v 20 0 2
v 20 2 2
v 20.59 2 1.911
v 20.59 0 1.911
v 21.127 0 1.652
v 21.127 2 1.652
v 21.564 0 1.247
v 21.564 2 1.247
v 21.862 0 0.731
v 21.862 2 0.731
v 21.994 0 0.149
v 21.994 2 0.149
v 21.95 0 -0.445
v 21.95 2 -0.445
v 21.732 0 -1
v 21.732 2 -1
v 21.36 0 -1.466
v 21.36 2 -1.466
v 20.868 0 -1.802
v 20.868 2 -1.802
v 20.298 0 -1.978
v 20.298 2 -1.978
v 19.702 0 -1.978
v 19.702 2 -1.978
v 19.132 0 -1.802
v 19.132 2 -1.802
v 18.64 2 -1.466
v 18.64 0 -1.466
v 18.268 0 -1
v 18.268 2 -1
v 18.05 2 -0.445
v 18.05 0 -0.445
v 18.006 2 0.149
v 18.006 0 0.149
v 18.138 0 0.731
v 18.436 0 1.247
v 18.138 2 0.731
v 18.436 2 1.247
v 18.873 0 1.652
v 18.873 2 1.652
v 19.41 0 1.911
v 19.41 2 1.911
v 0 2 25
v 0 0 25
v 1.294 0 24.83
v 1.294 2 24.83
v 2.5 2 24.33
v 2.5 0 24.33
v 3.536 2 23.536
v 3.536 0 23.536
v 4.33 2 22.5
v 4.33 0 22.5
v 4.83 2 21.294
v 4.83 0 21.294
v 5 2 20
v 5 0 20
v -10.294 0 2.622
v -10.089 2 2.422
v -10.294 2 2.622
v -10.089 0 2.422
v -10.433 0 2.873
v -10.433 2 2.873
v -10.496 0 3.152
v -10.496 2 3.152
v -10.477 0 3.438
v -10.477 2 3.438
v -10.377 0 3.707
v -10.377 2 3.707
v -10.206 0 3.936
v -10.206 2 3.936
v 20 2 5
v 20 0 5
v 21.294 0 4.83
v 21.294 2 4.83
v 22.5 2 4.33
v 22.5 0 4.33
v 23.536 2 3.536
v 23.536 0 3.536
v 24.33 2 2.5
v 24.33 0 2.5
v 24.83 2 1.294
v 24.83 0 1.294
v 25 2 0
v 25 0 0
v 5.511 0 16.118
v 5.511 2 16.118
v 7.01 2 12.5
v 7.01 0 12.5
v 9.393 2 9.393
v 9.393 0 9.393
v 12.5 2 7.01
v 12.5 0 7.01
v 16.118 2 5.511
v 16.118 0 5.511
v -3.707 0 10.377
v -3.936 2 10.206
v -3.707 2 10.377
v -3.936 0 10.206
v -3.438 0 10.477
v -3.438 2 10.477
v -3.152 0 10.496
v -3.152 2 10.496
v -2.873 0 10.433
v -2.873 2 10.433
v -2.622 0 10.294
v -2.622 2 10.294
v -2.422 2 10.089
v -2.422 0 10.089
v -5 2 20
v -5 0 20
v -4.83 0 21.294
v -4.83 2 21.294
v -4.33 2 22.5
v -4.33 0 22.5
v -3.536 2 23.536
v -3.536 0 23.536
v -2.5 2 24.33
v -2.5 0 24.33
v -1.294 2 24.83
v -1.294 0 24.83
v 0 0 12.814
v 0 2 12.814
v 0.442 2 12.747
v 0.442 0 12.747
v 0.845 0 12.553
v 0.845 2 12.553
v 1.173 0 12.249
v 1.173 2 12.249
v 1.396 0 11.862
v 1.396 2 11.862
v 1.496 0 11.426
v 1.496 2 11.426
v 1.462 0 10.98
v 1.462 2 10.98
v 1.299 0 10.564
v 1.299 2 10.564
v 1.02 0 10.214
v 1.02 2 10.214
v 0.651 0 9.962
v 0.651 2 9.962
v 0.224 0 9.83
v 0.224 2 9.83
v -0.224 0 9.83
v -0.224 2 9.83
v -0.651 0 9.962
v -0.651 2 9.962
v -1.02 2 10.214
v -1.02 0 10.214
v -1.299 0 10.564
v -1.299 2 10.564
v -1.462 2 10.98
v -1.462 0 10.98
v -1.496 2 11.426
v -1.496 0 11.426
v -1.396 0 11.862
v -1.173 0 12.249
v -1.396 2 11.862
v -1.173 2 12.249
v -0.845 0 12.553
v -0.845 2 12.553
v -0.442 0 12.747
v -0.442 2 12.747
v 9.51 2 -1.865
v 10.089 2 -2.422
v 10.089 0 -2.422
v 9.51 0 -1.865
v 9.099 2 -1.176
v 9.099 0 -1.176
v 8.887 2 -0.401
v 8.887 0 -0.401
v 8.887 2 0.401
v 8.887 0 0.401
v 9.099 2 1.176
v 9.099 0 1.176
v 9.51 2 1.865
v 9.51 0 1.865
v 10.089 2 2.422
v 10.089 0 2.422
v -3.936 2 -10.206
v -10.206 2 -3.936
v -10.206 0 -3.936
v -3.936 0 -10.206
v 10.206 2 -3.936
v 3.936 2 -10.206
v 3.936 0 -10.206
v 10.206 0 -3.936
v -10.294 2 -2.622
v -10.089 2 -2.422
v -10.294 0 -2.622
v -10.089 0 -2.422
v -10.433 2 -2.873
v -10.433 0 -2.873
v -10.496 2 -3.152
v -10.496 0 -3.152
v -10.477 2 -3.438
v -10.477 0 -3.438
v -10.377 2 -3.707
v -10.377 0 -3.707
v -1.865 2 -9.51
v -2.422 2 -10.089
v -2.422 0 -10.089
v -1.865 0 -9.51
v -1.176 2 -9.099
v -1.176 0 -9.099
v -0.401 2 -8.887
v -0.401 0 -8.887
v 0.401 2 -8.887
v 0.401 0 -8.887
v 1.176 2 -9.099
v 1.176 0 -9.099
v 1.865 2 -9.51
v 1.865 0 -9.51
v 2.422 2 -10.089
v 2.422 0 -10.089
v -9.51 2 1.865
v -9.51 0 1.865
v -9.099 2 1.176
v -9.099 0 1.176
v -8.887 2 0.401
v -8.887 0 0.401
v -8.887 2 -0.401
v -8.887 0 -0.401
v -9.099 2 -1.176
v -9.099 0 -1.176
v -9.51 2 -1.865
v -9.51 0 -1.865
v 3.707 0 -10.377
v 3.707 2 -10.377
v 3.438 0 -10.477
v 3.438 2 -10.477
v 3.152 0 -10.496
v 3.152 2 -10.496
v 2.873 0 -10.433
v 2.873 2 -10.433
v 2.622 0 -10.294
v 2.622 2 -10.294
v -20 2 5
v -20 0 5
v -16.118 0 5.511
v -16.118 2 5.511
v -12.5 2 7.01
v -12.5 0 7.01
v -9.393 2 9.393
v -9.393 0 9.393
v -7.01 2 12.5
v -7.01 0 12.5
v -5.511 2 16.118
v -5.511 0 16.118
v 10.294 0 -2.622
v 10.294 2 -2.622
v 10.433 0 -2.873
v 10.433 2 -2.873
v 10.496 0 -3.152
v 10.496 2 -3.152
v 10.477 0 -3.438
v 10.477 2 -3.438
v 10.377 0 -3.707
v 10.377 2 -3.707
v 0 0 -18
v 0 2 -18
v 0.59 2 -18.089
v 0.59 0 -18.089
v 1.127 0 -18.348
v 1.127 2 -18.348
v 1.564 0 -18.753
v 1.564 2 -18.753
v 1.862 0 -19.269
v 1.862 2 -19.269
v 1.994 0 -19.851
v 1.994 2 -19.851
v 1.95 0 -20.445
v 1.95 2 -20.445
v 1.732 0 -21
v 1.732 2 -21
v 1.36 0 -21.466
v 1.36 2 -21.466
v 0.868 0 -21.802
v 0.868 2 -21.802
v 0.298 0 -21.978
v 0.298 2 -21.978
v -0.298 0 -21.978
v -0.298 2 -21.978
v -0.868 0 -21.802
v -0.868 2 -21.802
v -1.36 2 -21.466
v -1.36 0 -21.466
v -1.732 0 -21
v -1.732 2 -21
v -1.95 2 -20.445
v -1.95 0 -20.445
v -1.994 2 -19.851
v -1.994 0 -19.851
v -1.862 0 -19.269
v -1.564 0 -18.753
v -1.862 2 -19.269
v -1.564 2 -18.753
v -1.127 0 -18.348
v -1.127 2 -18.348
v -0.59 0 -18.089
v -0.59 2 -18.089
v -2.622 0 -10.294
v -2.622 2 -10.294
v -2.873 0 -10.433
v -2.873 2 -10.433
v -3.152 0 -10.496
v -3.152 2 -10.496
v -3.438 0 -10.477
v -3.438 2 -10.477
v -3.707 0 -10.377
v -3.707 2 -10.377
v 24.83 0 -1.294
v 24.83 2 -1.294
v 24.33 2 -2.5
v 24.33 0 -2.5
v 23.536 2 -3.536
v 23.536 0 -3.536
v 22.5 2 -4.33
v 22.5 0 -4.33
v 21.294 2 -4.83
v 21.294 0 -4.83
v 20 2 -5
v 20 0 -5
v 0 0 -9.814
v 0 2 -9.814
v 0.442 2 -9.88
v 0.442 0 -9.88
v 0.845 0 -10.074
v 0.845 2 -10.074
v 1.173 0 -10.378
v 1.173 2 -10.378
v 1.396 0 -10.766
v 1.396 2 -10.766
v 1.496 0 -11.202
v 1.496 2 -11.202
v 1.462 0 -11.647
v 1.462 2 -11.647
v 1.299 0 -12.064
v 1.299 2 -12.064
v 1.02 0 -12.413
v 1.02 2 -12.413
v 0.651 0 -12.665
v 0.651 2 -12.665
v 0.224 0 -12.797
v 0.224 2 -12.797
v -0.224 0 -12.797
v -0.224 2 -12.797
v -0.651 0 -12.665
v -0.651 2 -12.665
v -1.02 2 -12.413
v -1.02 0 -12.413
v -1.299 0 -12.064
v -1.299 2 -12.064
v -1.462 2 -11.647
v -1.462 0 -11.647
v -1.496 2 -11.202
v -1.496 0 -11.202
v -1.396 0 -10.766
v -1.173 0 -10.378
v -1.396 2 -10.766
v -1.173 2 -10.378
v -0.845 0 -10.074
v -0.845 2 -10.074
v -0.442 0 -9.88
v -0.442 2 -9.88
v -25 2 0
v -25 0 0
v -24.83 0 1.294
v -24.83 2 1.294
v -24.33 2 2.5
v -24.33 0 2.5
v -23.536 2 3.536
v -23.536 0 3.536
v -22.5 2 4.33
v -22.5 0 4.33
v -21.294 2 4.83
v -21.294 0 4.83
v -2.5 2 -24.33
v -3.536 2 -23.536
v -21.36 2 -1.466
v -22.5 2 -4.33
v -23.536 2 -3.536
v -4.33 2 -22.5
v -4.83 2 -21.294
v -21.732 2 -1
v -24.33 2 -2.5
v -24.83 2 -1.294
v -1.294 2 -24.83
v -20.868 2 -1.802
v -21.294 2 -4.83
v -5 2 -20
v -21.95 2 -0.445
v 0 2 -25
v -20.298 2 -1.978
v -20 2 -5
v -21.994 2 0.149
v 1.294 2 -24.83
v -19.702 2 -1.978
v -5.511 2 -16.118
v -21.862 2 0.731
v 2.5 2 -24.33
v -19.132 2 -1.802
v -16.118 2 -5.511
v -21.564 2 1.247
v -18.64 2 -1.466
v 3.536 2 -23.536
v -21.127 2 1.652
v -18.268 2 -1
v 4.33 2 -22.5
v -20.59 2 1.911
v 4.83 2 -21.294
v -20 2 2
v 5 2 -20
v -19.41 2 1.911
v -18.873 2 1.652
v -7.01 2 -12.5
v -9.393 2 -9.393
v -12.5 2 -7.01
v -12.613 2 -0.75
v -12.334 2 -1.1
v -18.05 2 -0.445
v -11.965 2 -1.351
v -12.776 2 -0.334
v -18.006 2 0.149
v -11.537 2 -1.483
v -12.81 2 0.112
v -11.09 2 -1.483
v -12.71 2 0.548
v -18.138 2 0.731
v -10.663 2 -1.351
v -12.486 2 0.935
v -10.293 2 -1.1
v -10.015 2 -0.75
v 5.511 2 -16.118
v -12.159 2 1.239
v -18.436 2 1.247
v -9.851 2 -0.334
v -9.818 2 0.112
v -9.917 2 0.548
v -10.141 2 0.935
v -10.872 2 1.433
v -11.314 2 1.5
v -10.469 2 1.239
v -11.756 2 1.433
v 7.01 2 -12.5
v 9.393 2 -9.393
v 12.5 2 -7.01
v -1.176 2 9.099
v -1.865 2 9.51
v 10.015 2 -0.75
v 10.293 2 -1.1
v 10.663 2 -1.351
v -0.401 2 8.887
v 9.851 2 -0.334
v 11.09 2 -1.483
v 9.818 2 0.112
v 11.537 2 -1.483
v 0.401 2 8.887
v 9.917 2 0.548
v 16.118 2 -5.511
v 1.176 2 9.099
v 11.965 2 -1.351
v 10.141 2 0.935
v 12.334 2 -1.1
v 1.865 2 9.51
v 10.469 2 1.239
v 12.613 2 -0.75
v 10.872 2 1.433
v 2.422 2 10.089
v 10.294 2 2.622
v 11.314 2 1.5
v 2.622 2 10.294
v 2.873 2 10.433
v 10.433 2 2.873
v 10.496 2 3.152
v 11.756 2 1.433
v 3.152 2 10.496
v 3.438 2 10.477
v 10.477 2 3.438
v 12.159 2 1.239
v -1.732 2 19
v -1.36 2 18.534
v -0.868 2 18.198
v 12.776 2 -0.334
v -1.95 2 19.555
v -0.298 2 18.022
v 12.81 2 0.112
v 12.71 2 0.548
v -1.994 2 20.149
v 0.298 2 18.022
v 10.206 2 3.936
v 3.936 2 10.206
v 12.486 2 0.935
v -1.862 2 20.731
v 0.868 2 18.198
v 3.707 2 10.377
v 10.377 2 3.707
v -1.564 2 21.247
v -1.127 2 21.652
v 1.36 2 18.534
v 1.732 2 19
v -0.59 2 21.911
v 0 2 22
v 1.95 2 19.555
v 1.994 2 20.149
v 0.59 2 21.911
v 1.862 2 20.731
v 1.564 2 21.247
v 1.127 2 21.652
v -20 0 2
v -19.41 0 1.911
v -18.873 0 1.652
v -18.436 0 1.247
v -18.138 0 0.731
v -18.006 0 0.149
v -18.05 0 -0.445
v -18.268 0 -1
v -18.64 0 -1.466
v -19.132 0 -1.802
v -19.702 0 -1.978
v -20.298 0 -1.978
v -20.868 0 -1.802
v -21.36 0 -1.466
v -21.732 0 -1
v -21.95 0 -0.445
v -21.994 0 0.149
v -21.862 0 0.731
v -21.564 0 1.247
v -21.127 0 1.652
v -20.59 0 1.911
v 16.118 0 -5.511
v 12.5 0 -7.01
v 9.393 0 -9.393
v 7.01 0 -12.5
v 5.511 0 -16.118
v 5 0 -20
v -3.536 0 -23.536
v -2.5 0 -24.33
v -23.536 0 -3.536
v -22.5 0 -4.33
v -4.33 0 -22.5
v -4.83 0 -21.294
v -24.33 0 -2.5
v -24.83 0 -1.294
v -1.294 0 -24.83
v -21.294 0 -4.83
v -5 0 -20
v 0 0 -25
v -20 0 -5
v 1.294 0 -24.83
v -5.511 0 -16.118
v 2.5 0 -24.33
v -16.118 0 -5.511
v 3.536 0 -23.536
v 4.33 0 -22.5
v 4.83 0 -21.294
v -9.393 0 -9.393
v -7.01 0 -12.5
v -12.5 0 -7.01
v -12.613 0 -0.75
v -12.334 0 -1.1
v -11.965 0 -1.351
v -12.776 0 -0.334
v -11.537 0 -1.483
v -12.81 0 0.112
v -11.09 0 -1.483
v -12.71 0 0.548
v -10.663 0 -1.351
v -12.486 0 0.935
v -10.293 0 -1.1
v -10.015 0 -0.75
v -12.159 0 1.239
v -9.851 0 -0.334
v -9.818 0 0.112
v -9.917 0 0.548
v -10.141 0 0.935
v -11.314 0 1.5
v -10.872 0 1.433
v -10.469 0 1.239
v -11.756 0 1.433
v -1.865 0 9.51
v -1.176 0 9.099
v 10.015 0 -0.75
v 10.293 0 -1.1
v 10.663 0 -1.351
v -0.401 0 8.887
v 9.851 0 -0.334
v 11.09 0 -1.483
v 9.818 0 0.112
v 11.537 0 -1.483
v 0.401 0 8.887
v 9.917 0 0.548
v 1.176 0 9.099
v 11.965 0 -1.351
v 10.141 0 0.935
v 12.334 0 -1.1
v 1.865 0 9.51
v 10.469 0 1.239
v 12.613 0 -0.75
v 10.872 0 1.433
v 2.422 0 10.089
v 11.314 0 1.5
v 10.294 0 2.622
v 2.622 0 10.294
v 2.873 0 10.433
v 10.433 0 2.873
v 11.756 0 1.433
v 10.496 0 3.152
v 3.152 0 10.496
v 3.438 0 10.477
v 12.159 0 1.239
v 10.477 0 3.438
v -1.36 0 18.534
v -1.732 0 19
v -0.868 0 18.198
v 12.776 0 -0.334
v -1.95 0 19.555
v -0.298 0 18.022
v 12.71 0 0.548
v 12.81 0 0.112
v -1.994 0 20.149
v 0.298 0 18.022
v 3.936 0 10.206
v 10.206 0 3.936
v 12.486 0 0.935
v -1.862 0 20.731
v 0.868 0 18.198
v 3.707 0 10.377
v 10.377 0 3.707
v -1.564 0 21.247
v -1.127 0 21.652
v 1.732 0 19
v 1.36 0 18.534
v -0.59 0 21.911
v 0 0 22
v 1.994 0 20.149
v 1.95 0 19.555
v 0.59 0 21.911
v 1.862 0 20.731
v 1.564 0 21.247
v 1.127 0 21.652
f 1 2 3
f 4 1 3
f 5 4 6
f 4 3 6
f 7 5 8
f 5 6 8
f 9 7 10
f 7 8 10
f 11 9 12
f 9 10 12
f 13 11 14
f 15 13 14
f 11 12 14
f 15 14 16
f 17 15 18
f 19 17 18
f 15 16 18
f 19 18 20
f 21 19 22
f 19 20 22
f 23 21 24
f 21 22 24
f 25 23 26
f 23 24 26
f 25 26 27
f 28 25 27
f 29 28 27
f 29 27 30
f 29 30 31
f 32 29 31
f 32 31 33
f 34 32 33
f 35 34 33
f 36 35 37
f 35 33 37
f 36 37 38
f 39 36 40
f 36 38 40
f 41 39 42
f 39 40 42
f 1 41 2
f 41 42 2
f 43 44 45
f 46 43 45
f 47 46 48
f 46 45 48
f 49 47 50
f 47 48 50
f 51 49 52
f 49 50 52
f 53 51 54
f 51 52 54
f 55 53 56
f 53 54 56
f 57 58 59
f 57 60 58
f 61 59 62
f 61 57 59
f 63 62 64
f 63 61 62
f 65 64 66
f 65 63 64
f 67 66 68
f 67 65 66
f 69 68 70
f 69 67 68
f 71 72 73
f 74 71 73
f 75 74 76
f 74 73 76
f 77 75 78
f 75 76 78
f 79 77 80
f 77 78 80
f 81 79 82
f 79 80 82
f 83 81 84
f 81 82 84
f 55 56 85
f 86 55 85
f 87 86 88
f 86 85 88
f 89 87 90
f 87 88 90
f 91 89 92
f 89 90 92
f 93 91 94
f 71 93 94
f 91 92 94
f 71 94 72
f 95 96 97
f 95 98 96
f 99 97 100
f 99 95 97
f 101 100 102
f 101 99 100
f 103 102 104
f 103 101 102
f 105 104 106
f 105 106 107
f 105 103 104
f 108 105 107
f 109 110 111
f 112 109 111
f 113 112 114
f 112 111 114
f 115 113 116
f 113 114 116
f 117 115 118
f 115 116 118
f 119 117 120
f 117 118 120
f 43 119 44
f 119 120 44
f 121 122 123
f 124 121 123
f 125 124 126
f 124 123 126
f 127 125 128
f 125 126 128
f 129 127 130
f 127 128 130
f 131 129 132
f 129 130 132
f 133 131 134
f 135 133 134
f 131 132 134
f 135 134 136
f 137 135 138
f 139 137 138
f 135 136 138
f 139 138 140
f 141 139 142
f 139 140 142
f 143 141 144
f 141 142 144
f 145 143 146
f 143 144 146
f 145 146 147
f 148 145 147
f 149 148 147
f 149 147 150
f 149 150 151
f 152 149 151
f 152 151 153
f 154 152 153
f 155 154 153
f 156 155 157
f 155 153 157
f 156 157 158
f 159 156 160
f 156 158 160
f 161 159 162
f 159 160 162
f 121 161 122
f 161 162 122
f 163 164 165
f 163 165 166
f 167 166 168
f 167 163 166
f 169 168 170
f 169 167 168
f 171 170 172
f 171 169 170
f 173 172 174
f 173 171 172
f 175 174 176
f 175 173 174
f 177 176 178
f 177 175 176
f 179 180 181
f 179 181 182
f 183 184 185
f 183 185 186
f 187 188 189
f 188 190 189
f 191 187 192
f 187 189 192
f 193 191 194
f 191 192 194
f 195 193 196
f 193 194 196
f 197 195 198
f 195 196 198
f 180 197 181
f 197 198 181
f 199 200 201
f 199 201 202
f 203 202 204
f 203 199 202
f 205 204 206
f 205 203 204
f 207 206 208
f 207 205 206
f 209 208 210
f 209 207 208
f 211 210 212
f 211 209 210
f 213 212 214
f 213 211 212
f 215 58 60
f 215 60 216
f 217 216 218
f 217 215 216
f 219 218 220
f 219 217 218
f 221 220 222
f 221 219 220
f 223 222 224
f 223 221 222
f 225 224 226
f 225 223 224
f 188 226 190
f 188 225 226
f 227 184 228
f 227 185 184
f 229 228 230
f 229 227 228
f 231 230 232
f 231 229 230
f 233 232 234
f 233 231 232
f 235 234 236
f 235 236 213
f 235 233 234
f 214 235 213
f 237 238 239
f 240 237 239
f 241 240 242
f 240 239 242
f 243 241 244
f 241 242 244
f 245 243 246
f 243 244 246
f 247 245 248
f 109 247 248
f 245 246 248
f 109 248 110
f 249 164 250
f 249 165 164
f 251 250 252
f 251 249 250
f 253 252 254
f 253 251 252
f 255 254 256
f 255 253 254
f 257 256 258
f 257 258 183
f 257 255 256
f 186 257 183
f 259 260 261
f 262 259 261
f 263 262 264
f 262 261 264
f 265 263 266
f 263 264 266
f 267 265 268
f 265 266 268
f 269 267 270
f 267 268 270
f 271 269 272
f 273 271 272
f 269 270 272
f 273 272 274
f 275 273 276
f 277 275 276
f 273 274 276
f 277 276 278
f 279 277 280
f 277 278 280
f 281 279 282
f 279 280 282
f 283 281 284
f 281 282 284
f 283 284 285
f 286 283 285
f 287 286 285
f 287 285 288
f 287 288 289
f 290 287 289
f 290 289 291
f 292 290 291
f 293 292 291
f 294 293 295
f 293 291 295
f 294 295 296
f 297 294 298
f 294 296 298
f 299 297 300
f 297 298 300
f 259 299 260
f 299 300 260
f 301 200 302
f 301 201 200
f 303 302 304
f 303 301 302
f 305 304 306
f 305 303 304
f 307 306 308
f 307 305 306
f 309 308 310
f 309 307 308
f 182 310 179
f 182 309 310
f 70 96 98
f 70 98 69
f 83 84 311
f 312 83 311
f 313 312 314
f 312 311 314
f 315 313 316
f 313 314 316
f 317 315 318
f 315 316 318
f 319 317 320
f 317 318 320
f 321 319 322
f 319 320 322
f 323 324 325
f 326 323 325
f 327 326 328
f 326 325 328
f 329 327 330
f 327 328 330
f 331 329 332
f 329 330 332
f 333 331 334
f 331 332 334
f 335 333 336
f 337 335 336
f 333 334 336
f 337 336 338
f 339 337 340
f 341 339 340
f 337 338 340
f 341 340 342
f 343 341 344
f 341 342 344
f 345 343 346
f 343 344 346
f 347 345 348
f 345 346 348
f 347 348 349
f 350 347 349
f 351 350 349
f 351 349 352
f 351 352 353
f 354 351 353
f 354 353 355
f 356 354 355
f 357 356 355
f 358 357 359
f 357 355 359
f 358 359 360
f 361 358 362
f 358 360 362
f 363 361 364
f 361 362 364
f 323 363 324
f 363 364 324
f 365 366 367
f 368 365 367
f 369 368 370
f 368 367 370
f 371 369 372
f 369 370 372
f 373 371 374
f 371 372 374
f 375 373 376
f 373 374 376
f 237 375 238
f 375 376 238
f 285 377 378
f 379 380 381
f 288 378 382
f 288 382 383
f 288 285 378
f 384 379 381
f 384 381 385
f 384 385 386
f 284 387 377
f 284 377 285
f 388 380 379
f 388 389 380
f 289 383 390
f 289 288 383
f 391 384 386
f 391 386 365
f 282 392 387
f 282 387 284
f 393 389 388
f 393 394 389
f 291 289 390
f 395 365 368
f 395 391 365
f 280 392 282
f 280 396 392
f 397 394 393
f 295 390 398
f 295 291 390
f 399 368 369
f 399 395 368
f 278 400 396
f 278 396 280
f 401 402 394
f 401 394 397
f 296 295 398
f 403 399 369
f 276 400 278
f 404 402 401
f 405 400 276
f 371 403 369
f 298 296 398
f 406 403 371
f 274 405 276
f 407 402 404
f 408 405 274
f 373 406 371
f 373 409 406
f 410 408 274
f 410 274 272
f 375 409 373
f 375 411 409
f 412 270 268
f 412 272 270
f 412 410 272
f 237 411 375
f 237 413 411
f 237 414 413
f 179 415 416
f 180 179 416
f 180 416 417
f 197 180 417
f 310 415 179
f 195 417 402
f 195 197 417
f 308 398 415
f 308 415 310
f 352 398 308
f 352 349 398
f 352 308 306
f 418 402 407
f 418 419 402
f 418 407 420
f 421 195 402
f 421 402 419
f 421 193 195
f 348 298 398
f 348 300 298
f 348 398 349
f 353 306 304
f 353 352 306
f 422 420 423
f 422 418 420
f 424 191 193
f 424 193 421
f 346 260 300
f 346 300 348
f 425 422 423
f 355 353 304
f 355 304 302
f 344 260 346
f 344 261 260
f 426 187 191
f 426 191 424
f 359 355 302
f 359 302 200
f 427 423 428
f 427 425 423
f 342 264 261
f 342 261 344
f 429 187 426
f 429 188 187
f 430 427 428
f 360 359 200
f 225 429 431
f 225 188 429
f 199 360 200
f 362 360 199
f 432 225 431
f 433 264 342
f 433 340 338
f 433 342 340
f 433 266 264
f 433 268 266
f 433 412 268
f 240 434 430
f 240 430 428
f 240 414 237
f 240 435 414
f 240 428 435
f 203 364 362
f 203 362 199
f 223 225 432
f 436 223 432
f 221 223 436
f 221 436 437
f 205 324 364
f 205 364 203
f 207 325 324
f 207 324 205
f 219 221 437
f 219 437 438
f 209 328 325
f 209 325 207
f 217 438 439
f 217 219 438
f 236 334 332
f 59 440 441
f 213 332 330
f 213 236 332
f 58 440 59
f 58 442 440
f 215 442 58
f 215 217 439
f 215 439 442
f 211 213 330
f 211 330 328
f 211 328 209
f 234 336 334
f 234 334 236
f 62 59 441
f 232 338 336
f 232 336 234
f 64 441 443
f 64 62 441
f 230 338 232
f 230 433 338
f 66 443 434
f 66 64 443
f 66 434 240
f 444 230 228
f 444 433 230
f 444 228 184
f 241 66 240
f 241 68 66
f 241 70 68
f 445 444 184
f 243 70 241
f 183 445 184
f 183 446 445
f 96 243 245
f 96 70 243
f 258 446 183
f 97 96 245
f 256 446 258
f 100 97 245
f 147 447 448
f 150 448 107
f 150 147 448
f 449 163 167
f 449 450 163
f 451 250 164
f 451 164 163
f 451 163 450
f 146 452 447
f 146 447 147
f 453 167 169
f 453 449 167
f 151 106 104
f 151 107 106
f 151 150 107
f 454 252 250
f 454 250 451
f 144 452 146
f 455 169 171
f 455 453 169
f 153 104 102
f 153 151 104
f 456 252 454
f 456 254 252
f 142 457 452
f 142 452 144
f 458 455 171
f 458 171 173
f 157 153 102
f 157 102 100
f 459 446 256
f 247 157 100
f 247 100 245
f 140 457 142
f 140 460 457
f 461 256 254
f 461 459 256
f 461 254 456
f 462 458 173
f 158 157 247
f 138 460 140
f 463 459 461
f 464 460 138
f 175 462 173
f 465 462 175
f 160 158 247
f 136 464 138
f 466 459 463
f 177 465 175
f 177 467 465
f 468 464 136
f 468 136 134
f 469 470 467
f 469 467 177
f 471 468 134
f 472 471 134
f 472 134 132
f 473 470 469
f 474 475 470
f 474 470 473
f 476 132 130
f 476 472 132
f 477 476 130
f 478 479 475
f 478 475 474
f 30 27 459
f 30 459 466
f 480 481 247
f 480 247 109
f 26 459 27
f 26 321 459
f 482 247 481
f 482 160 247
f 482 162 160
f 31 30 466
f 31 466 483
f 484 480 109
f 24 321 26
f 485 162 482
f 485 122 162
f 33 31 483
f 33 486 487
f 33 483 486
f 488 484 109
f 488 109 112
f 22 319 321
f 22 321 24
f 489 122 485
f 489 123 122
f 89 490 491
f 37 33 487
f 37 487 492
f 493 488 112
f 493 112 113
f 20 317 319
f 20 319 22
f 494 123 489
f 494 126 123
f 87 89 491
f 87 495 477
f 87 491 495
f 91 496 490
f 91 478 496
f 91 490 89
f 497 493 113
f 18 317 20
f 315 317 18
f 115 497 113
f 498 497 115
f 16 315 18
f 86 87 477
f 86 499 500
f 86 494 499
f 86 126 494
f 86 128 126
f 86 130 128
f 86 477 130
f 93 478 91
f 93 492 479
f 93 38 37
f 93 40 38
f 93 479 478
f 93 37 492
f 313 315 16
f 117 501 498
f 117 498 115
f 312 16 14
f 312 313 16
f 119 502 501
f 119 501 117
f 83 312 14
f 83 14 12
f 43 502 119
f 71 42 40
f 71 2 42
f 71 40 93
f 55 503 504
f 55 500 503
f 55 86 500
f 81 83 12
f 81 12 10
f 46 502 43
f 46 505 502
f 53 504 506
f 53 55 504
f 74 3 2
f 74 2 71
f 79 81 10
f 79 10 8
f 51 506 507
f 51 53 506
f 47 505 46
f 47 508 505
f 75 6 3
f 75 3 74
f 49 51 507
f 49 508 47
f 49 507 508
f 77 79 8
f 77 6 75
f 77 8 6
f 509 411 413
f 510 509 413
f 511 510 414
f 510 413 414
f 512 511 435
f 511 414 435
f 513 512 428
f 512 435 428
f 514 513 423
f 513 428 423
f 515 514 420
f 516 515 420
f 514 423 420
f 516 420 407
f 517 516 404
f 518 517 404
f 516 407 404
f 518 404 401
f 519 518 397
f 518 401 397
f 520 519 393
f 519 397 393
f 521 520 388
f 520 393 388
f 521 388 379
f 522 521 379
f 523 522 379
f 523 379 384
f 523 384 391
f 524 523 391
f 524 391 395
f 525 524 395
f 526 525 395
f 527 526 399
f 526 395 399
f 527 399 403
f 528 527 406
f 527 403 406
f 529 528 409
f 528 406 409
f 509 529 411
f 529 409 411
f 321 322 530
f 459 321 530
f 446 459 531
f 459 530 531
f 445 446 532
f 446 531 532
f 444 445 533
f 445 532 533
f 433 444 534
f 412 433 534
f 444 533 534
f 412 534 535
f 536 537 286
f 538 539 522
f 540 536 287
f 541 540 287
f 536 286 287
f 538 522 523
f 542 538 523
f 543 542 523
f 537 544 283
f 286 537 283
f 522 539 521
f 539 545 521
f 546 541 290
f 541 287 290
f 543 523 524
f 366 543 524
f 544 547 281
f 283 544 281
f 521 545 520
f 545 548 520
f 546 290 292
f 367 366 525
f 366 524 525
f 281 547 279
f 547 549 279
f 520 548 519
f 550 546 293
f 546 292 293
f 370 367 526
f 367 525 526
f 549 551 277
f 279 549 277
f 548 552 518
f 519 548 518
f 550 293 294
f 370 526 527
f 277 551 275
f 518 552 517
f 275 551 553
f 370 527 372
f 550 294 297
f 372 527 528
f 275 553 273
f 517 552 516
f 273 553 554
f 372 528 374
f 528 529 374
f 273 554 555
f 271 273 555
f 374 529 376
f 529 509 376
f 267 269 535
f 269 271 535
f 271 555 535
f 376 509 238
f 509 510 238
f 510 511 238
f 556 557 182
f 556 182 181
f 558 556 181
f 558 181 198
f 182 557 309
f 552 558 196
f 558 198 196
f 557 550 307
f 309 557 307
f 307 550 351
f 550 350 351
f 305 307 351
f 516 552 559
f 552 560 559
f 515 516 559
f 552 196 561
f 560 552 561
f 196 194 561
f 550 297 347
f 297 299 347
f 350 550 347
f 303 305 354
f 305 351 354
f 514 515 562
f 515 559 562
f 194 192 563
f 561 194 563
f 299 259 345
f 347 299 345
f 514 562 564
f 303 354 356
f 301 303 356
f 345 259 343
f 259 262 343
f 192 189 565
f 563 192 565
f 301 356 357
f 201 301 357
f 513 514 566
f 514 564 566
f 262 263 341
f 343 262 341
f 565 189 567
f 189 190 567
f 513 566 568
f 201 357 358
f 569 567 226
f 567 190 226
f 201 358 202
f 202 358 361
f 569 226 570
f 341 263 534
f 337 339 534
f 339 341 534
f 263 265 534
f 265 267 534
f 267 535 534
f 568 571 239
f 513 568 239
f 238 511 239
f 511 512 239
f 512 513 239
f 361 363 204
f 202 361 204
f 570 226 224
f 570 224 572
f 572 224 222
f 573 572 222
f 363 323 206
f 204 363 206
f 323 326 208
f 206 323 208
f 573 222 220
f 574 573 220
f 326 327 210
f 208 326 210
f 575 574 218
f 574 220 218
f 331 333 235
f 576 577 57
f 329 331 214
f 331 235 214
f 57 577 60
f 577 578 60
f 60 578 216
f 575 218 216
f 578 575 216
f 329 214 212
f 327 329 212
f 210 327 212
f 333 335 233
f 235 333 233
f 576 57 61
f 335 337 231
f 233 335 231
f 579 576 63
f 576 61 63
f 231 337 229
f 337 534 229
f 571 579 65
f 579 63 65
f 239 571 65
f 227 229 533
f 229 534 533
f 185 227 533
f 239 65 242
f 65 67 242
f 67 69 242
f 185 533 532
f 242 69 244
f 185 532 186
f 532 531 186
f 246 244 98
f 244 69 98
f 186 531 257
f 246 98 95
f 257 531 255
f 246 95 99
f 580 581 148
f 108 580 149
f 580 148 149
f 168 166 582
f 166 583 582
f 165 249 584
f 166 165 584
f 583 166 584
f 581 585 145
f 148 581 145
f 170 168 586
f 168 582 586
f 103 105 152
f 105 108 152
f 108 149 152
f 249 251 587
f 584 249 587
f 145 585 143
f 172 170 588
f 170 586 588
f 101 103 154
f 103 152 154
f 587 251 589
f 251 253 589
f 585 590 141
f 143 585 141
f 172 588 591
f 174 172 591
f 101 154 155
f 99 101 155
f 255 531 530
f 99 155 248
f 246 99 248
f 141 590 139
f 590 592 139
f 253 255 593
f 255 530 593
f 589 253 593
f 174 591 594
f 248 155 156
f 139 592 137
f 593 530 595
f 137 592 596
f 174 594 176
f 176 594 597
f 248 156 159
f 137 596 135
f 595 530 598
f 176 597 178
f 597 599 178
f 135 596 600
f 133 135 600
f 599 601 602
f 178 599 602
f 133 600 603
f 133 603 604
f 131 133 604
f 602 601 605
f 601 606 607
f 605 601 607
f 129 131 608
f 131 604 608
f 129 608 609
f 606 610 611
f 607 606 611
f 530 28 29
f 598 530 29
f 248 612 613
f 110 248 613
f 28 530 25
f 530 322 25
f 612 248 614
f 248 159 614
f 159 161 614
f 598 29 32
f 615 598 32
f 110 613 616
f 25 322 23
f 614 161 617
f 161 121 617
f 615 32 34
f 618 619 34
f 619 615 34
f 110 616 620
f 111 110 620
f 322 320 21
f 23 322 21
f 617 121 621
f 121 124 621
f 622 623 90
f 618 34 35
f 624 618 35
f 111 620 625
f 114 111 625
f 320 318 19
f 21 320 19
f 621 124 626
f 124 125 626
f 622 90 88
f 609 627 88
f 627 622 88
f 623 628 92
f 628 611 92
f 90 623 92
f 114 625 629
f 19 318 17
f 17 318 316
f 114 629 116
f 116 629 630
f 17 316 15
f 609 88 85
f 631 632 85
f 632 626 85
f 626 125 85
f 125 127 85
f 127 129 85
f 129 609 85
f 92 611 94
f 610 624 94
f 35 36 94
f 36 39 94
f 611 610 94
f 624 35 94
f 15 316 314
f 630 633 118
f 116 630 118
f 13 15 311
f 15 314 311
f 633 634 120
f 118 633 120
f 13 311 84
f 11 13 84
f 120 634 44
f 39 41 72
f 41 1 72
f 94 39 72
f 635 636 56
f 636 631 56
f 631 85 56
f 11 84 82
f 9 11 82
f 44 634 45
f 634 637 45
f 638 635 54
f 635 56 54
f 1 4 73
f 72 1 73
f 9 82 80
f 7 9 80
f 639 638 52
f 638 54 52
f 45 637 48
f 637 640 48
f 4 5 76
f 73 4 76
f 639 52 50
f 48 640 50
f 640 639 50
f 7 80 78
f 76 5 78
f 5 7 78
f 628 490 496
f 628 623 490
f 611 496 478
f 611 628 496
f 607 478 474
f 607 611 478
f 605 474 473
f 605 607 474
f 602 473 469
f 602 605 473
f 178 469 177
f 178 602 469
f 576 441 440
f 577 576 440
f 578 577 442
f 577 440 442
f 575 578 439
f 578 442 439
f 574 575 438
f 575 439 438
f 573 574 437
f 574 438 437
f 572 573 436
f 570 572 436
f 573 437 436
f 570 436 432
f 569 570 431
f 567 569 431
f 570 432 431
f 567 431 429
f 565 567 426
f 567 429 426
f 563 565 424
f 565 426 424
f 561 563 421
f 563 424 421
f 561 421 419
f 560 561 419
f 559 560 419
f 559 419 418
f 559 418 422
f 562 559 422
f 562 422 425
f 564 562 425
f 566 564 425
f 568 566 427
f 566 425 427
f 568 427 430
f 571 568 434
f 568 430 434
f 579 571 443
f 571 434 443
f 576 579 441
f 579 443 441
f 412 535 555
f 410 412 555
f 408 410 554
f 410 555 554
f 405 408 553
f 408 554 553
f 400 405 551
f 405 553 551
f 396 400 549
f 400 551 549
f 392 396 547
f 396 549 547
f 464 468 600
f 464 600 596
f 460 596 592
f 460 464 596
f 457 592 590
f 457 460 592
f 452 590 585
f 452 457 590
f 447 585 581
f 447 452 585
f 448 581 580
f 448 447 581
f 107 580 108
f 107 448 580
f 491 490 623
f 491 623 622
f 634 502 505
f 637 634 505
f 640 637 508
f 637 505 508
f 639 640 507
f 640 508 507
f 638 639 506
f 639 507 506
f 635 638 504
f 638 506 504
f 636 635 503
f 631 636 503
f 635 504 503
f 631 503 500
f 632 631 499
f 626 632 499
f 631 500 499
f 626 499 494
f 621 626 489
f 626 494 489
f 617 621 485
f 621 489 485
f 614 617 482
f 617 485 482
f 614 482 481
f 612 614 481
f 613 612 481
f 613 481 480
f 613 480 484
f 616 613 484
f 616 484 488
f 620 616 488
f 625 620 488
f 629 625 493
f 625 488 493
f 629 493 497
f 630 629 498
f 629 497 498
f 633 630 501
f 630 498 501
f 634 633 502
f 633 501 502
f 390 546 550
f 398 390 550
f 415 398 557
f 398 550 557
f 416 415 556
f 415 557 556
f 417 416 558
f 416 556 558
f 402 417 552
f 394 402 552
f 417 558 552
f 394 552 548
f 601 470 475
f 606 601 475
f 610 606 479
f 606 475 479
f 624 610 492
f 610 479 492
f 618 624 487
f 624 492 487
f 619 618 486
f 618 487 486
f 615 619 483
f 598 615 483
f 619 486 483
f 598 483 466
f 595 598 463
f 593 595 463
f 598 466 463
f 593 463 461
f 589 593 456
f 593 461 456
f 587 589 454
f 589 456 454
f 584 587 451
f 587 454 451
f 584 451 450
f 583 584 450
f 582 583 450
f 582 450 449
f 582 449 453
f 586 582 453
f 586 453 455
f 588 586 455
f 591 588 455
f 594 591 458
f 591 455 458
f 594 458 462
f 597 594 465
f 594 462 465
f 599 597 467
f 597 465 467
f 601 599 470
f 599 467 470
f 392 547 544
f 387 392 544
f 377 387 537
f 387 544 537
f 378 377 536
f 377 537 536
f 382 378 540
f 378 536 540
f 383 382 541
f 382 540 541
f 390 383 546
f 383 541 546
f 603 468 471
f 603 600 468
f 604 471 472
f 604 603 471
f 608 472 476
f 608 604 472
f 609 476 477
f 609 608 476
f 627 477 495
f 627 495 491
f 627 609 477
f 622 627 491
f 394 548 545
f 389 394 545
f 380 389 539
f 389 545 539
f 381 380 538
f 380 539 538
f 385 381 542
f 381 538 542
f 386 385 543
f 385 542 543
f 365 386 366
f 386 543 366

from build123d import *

# Parameters (mm, degrees)
BOSS_EXTRUDE1_DEPTH = 2
CIRPATTERN1_COUNT   = 4
SKETCH2_R           = 1.5
SKETCH2_R_2         = 2
CUT_EXTRUDE1_DEPTH  = 2
CUT_EXTRUDE2_DEPTH  = 2
FILLET2_R           = 1


with BuildPart() as part:
    # Sketch1 → Boss-Extrude1 (new body)
    with BuildSketch(Plane(origin=(0, 0, 0), x_dir=(1, 0, 0), z_dir=(0, 1, 0))):
        with BuildLine():
            Line((0, 25), (0, 0))
            Line((0, 0), (25, 0))
            ThreePointArc((25, 0), (23.535533906, 3.535533906), (20, 5))
            ThreePointArc((20, 5), (9.393398282, 9.393398282), (5, 20))
            ThreePointArc((5, 20), (3.535533906, 23.535533906), (0, 25))
        make_face()
    boss_extrude1 = extrude(amount=BOSS_EXTRUDE1_DEPTH)

    # CirPattern1: Boss-Extrude1 ×4 about axis
    cirpattern1_axis = Axis((0, 0, 0), (0, 1, 0))
    for i in range(1, CIRPATTERN1_COUNT):
        add(boss_extrude1.rotate(cirpattern1_axis, i * 360 / CIRPATTERN1_COUNT))

    # Sketch2 → Cut-Extrude1 (cut)
    with BuildSketch(Plane(origin=(0, 2, 0), x_dir=(1, 0, 0), z_dir=(0, 1, 0))):
        with Locations(Location((0, 11.313708499, 0), (0, 0, 270))):
            Circle(SKETCH2_R)
        with Locations(Location((0, 20, 0), (0, 0, 270))):
            Circle(SKETCH2_R_2)
        with Locations(Location((11.313708499, 0, 0), (0, 0, 270))):
            Circle(SKETCH2_R)
        with Locations(Location((20, 0, 0), (0, 0, 270))):
            Circle(SKETCH2_R_2)
        with Locations(Location((0, -11.313708499, 0), (0, 0, 270))):
            Circle(SKETCH2_R)
        with Locations(Location((0, -20, 0), (0, 0, 270))):
            Circle(SKETCH2_R_2)
        with Locations(Location((-11.313708499, 0, 0), (0, 0, 270))):
            Circle(SKETCH2_R)
        with Locations(Location((-20, 0, 0), (0, 0, 270))):
            Circle(SKETCH2_R_2)
    extrude(amount=-CUT_EXTRUDE1_DEPTH, mode=Mode.SUBTRACT)

    # Sketch3 → Cut-Extrude2 (cut)
    with BuildSketch(Plane(origin=(0, 2, 0), x_dir=(1, 0, 0), z_dir=(0, 1, 0))):
        with BuildLine():
            Line((-11.212704416, 2.929431208), (-2.929431208, 11.212704416))
            ThreePointArc((-2.929431208, 11.212704416), (0, 8.859568233), (2.929431208, 11.212704416))
            Line((2.929431208, 11.212704416), (11.212704416, 2.929431208))
            ThreePointArc((11.212704416, 2.929431208), (8.859568233, 0), (11.212704416, -2.929431208))
            Line((11.212704416, -2.929431208), (2.929431208, -11.212704416))
            ThreePointArc((2.929431208, -11.212704416), (0, -8.859568233), (-2.929431208, -11.212704416))
            Line((-2.929431208, -11.212704416), (-11.212704416, -2.929431208))
            ThreePointArc((-11.212704416, -2.929431208), (-8.859568233, 0), (-11.212704416, 2.929431208))
        make_face()
    extrude(amount=-CUT_EXTRUDE2_DEPTH, mode=Mode.SUBTRACT)

    # Fillet2
    fillet2_edges = [part.edges().sort_by_distance(p)[0] for p in [
        (-11.212704416, 1, 2.929431208),
        (-11.212704416, 1, -2.929431208),
        (-2.929431208, 1, -11.212704416),
        (2.929431208, 1, -11.212704416),
        (11.212704416, 1, -2.929431208),
        (11.212704416, 1, 2.929431208),
        (2.929431208, 1, 11.212704416),
        (-2.929431208, 1, 11.212704416),
    ]]
    fillet(fillet2_edges, radius=FILLET2_R)


solid = part.part
